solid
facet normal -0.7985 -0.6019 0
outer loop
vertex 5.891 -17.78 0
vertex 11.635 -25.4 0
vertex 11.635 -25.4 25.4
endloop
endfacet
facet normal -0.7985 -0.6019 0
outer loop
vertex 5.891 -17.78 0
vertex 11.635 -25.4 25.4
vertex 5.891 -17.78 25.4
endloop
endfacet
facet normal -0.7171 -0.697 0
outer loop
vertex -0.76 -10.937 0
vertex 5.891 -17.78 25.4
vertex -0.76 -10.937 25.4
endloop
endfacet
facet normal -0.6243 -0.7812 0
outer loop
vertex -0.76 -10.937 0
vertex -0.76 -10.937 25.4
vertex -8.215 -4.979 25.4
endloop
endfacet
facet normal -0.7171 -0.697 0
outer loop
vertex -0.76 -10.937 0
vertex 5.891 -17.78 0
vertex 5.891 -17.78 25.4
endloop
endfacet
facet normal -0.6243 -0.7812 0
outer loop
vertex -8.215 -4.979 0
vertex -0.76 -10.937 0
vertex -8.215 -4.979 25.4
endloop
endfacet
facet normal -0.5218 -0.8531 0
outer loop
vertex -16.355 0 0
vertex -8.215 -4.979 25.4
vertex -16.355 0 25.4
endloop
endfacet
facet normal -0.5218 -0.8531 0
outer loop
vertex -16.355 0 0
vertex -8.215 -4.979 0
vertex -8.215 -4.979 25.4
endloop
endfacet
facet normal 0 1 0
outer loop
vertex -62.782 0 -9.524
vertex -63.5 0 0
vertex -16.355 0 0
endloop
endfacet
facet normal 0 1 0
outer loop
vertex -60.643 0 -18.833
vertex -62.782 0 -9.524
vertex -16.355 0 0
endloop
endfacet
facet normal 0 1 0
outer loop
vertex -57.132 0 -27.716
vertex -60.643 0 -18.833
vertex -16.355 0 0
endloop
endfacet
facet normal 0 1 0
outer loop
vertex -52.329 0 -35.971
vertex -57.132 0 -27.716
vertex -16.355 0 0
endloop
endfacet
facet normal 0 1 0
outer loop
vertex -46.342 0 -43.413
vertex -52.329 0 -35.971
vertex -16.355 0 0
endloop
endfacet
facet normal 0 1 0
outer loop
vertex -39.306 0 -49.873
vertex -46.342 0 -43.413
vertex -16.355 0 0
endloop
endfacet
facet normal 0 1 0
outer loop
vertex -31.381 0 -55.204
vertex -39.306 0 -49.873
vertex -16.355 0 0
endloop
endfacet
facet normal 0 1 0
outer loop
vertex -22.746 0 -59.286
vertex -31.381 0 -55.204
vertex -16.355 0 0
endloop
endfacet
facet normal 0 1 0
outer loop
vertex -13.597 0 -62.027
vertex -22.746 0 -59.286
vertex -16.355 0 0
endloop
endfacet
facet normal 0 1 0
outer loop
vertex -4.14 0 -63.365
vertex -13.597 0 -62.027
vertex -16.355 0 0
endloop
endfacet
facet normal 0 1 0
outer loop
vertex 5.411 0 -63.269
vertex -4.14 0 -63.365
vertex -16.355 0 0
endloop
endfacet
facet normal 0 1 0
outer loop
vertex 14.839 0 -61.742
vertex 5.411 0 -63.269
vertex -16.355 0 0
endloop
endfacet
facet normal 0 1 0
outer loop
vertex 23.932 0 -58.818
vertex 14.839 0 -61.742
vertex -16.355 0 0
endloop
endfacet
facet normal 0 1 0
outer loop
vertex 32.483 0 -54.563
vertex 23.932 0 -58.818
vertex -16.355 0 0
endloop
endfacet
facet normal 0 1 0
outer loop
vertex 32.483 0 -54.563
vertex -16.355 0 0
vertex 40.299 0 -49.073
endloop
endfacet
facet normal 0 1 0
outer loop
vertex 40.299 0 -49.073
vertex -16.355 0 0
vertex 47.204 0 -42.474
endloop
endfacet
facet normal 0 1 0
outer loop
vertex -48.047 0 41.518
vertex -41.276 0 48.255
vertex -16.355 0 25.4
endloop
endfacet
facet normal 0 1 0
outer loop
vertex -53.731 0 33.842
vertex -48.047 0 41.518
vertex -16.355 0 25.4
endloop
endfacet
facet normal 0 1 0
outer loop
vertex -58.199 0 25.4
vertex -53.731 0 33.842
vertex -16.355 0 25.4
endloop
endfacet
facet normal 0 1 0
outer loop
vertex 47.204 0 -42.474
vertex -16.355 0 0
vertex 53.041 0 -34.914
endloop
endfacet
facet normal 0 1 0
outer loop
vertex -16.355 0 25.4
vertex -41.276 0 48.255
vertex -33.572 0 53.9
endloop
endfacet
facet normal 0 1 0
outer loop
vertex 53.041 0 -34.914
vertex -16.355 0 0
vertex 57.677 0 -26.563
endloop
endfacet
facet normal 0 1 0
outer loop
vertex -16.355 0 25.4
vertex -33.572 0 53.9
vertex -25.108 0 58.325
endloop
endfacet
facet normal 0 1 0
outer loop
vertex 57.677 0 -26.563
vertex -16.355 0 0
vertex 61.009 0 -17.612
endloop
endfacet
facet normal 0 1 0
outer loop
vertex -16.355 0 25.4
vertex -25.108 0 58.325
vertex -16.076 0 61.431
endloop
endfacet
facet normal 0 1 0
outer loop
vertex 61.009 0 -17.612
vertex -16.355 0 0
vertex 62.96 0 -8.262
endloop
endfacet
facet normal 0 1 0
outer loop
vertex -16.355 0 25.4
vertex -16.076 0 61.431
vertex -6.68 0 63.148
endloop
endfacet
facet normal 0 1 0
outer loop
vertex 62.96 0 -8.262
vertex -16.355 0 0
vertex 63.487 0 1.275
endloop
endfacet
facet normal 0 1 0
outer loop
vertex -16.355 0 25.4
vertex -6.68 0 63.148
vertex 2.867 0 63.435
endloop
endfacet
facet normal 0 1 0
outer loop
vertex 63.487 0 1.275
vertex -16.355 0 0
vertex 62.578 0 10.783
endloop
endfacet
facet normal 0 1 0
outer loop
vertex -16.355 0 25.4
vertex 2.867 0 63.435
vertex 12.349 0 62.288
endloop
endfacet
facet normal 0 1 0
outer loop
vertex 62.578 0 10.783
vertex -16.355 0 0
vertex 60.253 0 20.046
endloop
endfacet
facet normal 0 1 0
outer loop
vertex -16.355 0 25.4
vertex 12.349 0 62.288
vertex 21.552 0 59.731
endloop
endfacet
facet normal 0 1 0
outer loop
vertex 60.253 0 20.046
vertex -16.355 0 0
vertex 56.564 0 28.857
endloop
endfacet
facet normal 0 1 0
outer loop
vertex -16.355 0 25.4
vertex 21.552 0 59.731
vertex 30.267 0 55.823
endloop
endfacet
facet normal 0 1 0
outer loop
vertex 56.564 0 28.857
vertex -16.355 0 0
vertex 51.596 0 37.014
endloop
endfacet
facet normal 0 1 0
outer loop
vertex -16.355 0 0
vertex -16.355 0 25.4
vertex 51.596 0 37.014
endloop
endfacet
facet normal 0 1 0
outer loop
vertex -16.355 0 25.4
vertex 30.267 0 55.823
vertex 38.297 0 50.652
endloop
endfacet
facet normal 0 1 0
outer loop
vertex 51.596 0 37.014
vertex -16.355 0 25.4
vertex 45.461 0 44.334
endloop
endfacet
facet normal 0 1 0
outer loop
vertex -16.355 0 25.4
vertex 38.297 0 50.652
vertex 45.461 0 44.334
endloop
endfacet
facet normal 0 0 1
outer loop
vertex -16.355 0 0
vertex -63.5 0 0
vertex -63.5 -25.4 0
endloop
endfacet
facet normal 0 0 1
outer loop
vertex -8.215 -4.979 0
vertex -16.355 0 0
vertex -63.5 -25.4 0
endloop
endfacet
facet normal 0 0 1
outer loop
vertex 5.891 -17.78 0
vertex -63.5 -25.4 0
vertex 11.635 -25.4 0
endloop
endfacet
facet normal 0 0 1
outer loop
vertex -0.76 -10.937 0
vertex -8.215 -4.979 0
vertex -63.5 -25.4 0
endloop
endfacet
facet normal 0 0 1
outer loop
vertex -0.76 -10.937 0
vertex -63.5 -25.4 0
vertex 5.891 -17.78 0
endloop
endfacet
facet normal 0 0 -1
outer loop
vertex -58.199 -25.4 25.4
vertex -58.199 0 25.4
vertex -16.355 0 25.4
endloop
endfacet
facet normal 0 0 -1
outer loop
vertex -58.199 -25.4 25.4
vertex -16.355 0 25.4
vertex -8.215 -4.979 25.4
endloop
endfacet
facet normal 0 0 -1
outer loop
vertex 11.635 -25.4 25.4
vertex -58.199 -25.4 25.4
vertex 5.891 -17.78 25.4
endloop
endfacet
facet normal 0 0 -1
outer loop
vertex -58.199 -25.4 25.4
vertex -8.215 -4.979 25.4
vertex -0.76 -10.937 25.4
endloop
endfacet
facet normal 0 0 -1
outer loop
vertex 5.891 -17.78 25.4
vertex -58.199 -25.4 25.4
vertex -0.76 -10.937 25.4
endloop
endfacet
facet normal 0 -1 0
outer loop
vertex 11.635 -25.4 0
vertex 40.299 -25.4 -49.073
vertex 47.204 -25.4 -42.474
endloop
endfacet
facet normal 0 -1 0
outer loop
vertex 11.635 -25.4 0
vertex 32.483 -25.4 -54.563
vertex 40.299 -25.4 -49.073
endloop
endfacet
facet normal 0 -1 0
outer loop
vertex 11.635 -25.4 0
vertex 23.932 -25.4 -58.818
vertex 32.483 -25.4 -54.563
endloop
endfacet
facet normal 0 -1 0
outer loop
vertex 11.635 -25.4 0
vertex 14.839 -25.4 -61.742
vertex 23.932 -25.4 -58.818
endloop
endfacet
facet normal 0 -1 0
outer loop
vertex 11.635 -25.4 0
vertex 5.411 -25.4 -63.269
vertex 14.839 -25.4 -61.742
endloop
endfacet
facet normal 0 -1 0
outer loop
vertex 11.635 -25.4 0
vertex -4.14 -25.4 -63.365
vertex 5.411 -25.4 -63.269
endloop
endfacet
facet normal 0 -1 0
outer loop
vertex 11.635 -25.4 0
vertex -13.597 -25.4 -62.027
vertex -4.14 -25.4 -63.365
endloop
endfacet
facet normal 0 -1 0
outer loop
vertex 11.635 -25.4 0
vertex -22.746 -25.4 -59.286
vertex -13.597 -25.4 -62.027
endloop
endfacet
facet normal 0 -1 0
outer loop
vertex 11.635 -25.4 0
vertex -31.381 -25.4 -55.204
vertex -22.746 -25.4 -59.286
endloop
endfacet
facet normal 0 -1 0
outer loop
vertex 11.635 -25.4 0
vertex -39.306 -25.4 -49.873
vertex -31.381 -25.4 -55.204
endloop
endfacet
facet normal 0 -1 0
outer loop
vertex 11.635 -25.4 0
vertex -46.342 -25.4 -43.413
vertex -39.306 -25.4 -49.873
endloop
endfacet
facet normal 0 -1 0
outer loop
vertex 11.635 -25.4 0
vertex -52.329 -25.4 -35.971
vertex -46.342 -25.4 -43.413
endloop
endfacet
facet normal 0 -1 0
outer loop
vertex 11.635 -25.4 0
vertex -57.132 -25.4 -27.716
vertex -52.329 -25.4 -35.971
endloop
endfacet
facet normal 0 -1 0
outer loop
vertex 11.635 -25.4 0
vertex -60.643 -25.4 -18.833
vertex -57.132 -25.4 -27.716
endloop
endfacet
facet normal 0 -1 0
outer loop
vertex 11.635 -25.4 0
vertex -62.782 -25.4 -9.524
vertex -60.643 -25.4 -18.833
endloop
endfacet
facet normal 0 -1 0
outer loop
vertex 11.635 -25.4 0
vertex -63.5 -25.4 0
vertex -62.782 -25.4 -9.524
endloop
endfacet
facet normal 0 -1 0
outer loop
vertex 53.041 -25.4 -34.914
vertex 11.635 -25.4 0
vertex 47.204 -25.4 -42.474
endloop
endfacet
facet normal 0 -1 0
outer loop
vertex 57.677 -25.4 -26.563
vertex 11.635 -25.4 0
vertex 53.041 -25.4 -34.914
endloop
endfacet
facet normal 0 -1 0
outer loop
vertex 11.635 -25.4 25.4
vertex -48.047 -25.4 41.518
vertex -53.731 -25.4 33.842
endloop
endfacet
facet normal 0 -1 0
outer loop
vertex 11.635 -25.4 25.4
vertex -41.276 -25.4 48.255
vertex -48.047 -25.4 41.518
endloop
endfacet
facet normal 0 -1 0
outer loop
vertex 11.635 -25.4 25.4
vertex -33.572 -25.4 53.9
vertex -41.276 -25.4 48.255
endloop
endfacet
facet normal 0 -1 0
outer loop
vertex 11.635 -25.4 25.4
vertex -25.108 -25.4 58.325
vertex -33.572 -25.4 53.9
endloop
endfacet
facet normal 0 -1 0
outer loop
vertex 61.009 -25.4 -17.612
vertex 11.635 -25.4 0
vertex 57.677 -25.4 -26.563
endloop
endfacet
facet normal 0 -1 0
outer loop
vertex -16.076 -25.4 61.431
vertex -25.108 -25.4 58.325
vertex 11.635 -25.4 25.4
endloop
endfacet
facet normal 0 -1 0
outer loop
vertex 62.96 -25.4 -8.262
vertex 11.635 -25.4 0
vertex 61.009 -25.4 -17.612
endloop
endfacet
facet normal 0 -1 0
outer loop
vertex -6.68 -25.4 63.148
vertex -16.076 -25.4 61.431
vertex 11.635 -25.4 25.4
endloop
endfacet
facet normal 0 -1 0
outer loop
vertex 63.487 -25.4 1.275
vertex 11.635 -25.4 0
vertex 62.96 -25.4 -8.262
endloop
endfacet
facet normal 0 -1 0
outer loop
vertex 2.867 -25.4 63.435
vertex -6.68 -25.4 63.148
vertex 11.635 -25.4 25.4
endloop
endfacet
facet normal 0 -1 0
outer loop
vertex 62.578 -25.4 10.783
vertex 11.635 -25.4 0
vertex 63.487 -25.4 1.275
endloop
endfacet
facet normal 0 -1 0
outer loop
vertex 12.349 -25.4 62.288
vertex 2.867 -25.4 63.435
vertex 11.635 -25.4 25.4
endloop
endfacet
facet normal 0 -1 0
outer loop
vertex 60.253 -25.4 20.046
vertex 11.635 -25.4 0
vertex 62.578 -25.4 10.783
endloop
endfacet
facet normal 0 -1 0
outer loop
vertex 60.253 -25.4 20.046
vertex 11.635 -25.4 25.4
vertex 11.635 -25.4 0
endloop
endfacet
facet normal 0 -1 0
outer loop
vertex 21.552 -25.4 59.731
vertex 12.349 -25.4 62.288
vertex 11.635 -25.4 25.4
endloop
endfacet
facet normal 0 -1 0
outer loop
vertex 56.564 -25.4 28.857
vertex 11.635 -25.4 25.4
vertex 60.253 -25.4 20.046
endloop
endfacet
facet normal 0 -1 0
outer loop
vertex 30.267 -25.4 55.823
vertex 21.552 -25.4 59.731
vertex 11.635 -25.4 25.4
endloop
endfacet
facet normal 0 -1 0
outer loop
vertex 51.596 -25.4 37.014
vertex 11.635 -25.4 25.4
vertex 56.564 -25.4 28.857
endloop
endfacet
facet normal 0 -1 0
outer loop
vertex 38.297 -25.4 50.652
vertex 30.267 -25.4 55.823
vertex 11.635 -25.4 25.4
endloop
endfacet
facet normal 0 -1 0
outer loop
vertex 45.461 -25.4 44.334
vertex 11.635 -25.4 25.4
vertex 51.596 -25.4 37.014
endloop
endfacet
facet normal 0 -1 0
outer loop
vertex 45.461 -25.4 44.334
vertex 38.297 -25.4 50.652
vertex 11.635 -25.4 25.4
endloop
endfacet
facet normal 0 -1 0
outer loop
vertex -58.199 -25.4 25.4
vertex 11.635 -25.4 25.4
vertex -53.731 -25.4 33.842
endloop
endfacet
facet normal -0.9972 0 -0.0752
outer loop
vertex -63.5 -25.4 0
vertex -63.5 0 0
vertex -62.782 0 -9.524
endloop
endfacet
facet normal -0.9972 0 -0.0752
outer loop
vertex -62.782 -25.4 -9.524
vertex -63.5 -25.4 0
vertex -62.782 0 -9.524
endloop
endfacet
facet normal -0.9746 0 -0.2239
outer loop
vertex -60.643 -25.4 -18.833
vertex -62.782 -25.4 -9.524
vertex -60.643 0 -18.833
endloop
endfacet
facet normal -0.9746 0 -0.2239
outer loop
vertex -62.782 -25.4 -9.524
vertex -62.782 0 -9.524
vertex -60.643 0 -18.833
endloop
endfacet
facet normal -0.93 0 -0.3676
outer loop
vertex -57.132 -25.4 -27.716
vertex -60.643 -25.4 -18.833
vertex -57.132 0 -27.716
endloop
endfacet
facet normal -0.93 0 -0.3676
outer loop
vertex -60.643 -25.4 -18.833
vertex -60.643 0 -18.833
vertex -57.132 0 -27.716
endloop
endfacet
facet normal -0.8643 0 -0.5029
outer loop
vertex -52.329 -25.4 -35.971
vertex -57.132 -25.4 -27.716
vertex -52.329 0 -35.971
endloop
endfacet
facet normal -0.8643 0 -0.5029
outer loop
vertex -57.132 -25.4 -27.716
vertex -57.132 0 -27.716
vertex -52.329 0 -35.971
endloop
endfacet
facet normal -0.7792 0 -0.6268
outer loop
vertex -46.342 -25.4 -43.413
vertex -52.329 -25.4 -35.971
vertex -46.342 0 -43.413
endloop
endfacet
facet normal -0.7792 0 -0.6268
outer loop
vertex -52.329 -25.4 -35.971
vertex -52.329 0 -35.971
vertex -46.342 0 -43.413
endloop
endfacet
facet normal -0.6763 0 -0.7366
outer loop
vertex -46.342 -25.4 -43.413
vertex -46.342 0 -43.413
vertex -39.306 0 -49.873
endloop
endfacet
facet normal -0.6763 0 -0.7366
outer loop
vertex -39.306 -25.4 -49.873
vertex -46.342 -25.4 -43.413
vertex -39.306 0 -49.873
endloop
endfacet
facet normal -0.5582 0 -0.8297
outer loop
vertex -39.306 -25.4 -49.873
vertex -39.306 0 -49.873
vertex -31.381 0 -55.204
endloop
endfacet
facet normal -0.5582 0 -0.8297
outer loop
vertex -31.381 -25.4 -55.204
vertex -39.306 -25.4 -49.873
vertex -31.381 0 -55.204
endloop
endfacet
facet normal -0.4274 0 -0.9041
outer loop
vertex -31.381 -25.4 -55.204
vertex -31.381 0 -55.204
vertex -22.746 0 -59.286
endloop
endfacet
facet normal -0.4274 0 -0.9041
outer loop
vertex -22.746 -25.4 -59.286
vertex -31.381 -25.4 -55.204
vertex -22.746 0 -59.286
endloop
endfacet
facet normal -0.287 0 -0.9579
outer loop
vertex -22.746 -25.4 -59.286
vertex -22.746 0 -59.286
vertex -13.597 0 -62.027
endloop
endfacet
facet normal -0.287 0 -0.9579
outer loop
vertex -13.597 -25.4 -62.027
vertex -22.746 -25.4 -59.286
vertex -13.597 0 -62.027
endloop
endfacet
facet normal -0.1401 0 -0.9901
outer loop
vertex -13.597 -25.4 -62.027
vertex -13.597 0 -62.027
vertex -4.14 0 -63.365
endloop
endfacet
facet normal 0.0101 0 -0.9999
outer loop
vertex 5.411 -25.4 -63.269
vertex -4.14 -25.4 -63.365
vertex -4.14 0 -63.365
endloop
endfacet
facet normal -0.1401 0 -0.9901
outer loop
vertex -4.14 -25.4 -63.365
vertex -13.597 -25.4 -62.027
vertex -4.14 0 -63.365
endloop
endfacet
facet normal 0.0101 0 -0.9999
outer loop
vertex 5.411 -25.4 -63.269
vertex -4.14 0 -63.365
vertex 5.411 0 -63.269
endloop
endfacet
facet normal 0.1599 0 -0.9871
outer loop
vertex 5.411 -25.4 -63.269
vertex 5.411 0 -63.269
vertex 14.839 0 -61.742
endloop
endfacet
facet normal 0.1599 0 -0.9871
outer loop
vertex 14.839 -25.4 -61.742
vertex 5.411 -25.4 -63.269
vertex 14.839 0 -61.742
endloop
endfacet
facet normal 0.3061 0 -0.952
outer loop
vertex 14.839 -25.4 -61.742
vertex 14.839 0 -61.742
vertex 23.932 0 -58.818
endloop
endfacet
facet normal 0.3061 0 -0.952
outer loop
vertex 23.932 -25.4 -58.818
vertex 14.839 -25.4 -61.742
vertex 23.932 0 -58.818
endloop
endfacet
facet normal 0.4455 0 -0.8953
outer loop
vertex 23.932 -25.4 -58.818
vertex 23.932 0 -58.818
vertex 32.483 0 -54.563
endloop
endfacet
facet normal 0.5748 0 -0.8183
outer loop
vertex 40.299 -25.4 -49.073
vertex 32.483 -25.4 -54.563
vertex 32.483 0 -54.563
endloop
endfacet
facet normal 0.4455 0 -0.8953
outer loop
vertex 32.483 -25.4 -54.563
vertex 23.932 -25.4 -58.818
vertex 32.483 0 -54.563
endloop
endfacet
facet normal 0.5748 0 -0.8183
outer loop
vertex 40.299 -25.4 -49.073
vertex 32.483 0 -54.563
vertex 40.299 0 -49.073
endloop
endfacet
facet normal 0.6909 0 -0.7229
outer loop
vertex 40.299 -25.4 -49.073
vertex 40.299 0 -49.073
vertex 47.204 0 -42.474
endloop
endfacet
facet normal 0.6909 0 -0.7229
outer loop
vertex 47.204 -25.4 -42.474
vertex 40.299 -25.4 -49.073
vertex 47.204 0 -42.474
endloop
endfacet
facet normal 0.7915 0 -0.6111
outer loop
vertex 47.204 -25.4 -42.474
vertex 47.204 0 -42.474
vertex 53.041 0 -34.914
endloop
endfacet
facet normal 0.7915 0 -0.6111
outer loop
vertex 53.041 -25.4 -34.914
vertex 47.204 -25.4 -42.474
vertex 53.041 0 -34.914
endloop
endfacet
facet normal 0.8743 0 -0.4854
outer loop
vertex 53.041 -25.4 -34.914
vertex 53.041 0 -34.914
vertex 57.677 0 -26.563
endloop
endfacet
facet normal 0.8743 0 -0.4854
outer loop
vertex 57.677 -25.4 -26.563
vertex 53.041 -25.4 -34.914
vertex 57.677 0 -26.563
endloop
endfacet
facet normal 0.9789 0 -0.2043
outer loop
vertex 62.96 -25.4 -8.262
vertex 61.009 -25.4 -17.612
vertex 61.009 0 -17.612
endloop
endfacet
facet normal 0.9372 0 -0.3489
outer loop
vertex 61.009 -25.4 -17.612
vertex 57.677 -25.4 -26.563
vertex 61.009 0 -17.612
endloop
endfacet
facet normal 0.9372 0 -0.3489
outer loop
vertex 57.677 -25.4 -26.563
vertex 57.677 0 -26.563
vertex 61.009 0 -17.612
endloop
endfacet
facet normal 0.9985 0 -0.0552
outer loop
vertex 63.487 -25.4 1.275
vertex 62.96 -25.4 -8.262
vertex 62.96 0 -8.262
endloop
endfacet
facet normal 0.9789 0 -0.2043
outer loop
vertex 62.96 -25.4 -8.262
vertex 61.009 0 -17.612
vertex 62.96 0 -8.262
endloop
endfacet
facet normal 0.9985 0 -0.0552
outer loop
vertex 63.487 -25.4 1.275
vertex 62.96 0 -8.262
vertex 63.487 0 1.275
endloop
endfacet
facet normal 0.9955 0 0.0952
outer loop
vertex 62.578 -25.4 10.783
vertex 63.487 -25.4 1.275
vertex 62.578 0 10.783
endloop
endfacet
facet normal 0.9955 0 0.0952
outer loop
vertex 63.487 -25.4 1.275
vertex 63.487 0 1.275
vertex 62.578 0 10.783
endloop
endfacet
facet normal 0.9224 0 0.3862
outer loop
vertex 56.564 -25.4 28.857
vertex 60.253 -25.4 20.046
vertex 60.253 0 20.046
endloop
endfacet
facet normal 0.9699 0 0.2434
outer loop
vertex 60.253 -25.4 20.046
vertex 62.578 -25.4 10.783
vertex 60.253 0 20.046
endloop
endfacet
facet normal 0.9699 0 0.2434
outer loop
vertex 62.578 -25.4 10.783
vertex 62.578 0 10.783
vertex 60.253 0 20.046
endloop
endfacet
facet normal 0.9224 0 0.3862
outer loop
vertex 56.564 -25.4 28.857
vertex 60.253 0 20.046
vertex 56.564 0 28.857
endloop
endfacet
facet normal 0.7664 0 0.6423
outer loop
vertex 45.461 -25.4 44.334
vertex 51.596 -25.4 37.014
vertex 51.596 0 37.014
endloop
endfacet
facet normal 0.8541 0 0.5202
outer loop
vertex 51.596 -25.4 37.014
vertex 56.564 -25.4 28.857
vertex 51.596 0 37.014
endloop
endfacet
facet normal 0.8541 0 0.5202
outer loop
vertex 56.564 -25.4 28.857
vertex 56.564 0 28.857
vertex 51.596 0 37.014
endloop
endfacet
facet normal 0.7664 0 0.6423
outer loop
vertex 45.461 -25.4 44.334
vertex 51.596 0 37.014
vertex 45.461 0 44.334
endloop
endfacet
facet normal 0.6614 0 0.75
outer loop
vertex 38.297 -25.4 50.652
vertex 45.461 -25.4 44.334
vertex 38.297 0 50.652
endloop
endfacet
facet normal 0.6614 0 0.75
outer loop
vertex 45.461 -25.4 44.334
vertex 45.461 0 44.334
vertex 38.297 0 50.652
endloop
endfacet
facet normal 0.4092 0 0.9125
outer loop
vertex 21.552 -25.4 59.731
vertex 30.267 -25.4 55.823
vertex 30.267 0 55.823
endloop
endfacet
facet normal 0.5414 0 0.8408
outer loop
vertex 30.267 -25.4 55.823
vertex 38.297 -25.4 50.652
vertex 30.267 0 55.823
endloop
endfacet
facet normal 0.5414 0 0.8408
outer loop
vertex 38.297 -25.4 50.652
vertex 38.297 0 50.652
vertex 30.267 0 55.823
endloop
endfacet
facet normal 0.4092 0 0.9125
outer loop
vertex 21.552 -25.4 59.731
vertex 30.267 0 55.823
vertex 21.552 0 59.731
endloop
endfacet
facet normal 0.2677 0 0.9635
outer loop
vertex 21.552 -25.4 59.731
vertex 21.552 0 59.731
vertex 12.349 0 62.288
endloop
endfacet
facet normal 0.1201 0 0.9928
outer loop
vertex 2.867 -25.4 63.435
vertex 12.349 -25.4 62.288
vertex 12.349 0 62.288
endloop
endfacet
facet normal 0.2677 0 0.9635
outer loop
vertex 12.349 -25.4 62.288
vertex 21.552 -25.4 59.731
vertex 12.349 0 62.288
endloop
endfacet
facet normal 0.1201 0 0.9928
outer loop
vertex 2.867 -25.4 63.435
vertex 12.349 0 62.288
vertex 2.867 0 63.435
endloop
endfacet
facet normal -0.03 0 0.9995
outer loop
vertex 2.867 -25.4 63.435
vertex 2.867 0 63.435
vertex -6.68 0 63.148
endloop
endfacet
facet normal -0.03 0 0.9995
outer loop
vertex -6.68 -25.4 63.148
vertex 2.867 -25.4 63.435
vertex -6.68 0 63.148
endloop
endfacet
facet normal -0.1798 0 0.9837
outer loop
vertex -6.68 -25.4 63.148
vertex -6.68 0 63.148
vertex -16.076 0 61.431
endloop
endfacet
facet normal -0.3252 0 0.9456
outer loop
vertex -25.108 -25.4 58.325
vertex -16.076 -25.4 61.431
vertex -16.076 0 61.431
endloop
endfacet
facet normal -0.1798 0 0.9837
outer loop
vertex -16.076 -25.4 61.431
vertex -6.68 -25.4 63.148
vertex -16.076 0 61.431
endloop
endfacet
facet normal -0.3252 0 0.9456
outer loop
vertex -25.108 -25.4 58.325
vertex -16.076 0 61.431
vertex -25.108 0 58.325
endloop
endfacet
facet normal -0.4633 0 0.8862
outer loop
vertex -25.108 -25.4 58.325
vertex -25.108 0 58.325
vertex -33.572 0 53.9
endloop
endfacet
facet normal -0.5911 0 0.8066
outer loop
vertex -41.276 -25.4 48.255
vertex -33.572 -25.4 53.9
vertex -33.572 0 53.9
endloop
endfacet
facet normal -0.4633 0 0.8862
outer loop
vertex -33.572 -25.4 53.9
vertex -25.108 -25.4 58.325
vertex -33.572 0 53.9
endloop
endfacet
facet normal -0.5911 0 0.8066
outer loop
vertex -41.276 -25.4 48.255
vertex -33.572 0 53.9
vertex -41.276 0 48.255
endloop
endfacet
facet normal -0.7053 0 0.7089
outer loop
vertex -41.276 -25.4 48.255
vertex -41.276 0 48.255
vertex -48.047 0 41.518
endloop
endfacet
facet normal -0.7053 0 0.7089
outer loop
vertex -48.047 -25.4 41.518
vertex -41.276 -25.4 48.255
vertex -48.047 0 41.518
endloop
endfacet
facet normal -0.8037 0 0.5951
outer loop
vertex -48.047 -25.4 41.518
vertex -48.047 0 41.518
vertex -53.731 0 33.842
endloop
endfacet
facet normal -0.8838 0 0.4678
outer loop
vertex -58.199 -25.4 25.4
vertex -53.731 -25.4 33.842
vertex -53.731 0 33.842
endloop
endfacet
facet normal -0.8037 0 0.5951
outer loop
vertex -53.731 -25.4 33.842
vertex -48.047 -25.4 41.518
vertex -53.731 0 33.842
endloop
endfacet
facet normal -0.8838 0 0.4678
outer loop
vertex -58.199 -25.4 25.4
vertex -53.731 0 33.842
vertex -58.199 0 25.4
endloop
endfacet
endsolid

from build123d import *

# Parameters (mm, degrees)
F0_R     = 63.5
F1_DEPTH = 25.4
F2_R     = 76.2
F3_DEPTH = 25.4


with BuildPart() as f1:
    # F0 (on Front) → F1 (new body)
    with BuildSketch(Plane.XZ):
        Circle(F0_R)
    extrude(amount=F1_DEPTH)


with BuildPart() as f3:
    # F2 (on Top) → F3 (new body)
    with BuildSketch(Plane.XY):
        with Locations((-51.968064, -67.365818)):
            Circle(F2_R)
    extrude(amount=F3_DEPTH)


with BuildPart() as f1_1:
    add(f1.part)

    # F4: cut F3
    add(f3.part, mode=Mode.SUBTRACT)


solid = f1_1.part
